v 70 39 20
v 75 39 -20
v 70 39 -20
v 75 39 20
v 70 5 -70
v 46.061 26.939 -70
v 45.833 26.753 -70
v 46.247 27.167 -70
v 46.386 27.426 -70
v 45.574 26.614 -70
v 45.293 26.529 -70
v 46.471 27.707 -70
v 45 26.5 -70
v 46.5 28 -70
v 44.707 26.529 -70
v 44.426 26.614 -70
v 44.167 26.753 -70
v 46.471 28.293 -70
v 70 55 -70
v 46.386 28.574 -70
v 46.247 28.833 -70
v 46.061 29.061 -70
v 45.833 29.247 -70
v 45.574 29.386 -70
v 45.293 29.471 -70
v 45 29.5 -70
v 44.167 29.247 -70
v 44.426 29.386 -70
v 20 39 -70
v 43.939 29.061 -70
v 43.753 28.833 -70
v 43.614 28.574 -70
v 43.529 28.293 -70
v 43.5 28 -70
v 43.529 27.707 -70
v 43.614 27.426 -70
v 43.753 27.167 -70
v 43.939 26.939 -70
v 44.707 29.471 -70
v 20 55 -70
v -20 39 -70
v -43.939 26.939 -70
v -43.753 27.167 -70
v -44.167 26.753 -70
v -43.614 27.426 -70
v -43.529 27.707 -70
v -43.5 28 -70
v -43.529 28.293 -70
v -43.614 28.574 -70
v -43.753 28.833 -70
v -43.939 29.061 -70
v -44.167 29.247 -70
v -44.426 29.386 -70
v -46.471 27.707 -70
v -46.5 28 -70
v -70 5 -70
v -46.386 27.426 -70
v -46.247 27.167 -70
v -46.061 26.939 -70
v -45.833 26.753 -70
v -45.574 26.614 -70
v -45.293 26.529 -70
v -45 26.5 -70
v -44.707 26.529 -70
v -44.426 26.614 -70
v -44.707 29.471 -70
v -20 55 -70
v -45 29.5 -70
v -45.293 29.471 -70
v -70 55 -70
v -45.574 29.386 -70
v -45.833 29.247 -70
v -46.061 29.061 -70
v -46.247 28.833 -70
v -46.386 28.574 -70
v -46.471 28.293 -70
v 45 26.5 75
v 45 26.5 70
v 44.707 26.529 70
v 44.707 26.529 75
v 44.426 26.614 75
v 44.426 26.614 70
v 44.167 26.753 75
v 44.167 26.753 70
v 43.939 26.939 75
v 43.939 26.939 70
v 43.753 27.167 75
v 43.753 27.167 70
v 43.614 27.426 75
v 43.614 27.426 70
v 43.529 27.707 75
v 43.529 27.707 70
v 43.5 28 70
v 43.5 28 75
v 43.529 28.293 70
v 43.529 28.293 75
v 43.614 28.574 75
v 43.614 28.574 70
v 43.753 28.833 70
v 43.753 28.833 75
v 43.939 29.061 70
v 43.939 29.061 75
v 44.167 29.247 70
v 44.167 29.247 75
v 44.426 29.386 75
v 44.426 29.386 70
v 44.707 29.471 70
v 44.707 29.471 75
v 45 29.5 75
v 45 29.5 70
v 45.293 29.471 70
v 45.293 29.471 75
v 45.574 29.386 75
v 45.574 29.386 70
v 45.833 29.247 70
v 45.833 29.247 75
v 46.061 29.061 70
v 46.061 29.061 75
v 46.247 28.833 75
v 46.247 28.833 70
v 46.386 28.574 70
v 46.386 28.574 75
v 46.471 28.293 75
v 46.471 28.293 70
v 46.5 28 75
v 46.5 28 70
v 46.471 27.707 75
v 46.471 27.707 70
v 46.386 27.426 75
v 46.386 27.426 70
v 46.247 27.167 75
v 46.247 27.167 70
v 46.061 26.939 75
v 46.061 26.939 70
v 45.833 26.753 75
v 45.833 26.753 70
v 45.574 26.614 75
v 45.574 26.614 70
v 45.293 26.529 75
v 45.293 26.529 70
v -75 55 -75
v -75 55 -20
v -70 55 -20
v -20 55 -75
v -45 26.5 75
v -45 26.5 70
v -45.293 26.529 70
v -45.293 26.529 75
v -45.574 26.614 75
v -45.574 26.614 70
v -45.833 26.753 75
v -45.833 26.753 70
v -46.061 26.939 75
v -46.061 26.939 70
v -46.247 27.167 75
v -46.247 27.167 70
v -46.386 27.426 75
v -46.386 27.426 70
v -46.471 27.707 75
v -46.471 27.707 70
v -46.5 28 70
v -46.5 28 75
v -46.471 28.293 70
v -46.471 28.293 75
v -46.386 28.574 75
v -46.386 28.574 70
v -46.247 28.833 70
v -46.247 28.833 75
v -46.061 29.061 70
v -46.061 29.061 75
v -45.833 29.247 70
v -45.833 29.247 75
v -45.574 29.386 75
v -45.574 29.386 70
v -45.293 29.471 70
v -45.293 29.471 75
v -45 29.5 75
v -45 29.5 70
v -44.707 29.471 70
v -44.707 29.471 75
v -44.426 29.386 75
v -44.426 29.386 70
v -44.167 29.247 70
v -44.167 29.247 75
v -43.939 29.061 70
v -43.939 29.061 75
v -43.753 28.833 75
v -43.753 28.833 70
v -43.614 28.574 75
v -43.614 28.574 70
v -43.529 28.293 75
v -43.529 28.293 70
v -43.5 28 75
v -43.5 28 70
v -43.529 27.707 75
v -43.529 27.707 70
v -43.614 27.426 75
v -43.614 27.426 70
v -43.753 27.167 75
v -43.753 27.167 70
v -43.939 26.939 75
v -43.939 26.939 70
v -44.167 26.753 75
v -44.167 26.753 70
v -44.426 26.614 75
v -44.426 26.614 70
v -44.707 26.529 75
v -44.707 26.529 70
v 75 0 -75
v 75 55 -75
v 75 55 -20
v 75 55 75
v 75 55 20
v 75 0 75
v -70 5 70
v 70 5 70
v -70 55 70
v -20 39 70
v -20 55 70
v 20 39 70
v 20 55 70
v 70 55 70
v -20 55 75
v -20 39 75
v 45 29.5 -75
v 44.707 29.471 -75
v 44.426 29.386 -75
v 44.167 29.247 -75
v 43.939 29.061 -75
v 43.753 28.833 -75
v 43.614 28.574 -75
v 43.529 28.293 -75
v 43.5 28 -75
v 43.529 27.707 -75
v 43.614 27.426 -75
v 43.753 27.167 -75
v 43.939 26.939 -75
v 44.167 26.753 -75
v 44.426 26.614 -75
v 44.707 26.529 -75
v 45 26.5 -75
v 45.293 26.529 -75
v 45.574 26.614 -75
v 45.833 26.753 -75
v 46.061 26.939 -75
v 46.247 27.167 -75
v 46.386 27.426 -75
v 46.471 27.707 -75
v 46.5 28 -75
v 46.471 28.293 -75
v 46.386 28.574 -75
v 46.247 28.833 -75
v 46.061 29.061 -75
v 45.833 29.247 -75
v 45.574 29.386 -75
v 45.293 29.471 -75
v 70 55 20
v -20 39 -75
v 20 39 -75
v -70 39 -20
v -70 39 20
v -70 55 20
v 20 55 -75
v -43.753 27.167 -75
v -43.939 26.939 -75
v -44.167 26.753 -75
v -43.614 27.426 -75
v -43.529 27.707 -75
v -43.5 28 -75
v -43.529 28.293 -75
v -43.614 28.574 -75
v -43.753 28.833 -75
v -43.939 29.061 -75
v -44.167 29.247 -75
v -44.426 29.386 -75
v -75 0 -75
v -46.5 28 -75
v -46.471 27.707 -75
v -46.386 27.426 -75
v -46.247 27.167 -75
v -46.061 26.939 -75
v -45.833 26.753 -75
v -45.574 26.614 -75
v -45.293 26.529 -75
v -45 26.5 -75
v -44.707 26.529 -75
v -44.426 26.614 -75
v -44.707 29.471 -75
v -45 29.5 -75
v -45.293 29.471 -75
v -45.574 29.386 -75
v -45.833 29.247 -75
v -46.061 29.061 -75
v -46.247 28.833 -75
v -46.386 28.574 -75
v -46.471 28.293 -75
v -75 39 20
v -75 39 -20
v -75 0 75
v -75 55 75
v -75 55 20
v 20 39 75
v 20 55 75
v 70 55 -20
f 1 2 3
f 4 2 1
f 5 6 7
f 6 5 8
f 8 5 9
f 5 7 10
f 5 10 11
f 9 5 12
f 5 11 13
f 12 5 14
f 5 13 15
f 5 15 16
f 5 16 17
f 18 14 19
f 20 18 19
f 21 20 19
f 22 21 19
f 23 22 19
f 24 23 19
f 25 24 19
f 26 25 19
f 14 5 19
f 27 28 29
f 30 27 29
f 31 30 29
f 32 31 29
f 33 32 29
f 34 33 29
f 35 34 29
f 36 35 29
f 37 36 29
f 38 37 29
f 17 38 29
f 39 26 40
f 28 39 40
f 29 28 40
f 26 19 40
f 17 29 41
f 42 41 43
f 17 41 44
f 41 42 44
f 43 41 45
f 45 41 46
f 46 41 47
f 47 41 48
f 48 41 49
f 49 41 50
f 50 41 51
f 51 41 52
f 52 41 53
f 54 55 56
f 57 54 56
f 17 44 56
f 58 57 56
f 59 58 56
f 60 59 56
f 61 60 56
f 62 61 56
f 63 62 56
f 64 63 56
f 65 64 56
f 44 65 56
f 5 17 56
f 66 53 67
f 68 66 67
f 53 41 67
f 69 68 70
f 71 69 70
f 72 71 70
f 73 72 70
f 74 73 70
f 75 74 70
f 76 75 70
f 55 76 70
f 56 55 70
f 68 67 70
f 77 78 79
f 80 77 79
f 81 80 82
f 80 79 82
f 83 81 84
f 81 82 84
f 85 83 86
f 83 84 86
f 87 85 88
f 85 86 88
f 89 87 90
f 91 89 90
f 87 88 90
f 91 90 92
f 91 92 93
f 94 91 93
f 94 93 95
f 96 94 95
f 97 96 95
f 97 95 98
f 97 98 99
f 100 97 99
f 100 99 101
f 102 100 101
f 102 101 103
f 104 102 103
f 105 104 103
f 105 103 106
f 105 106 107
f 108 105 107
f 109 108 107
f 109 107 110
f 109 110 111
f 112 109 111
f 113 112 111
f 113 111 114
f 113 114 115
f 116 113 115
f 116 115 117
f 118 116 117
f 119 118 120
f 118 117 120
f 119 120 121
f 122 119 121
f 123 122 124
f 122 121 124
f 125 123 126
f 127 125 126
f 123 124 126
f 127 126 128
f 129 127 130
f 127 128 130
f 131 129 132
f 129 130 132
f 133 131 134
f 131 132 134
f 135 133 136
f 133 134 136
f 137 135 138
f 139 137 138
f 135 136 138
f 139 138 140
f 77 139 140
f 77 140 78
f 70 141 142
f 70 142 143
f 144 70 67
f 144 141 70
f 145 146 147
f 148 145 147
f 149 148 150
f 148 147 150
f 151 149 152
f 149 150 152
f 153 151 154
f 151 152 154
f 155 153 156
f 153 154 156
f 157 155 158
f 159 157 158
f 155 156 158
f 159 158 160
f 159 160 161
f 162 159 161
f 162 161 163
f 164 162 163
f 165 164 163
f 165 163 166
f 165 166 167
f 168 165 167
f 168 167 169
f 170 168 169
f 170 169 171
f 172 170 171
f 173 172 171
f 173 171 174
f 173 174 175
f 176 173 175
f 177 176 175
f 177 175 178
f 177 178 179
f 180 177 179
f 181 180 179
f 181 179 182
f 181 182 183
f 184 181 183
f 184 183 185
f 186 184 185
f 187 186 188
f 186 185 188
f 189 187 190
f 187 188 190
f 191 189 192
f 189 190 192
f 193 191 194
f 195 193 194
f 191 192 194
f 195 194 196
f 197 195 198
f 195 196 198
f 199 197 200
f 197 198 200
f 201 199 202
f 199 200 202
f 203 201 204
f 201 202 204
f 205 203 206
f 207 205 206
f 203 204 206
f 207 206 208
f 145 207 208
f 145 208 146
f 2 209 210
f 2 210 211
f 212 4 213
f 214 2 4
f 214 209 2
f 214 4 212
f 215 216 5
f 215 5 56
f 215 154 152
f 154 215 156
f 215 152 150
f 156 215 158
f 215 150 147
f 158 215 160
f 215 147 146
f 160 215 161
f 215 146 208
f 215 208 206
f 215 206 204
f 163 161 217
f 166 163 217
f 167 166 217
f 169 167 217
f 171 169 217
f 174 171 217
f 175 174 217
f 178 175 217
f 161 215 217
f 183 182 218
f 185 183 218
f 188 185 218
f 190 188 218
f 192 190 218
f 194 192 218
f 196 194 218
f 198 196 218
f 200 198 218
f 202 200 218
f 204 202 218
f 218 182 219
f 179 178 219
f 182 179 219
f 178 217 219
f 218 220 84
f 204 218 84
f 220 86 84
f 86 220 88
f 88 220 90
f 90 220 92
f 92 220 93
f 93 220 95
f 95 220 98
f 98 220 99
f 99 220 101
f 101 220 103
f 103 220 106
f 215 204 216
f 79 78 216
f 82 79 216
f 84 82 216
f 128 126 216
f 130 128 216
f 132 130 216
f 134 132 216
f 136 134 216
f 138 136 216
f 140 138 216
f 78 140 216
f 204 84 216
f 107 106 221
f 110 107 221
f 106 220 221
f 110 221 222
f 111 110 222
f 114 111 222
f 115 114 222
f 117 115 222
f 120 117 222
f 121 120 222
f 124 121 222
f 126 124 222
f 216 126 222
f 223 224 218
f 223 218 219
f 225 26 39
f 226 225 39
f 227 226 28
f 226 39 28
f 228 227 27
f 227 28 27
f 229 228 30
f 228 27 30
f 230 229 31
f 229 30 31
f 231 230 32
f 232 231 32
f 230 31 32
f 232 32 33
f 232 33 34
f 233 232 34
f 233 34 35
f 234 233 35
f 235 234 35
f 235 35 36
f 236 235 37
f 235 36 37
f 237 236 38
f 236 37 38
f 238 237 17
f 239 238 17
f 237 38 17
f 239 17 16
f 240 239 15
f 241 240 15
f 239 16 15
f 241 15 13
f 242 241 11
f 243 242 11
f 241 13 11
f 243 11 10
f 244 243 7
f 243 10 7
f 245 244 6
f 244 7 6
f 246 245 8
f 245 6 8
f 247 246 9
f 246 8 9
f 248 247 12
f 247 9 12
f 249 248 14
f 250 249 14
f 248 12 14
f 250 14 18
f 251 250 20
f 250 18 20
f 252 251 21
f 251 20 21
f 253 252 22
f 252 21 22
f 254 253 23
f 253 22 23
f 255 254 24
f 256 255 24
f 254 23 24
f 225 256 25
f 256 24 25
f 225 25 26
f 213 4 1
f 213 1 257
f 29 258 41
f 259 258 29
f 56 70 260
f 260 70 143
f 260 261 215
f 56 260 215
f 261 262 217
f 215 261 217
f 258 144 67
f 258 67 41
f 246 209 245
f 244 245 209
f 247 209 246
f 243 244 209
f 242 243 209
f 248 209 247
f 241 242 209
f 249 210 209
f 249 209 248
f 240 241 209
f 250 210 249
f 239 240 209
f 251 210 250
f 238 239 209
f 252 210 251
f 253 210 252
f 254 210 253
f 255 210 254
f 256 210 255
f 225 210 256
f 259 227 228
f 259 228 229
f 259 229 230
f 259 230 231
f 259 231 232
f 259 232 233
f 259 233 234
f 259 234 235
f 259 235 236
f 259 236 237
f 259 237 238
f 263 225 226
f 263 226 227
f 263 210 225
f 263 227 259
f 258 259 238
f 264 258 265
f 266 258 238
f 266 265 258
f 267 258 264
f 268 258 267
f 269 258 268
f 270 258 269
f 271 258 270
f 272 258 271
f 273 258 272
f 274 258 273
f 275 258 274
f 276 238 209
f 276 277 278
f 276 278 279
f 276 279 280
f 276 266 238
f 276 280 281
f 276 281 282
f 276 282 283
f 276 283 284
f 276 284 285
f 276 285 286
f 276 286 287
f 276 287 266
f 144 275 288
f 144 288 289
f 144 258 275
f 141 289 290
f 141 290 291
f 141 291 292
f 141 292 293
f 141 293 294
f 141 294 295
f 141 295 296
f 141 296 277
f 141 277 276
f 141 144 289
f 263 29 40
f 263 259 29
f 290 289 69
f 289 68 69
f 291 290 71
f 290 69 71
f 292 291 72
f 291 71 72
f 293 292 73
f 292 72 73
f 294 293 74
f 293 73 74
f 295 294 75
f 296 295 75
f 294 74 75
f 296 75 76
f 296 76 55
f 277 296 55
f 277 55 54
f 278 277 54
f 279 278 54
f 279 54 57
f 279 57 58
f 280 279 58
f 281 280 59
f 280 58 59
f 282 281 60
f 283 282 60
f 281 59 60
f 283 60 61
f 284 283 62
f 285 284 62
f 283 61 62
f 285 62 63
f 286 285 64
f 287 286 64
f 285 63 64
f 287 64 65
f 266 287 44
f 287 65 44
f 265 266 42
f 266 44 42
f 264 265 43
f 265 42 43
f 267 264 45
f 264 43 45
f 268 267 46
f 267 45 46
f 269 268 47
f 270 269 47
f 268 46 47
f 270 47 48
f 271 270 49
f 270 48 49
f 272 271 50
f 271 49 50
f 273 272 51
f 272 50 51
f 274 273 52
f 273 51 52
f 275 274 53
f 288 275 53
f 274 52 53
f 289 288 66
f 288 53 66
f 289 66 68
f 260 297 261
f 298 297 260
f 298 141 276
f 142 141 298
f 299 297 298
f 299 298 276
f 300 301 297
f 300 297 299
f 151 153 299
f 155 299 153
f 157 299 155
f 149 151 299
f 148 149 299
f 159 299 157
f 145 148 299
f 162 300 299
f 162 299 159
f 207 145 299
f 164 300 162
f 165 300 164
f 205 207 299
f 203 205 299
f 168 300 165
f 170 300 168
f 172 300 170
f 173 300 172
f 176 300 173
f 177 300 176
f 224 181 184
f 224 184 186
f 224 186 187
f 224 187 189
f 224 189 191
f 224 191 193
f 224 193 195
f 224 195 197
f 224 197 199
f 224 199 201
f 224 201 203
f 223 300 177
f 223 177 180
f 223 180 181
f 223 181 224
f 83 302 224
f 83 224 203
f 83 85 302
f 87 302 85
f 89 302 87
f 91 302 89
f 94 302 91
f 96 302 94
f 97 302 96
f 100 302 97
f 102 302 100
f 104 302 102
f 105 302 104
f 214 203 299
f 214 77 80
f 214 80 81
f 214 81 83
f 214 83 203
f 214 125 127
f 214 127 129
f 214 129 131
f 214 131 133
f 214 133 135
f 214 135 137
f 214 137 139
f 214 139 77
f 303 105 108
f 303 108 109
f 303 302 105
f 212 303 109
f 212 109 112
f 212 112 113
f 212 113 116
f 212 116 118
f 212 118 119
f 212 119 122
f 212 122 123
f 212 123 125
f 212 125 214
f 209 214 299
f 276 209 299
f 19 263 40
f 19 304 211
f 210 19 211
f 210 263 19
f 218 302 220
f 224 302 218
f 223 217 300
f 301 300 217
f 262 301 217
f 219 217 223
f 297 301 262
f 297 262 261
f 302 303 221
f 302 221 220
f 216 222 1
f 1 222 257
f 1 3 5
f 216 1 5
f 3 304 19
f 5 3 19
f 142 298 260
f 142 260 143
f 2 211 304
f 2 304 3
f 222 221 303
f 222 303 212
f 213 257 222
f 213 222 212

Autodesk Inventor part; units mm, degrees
ref_plane "YZ Plane" through (0, 0, 0) normal (1, 0, 0) x (0, 1, 0)
ref_plane "XZ Plane" through (0, 0, 0) normal (0, 1, 0) x (-1, 0, 0)
ref_plane "XY Plane" through (0, 0, 0) normal (0, 0, 1) x (1, 0, 0)
sketch "Szkic1" plane through (0, 0, 0) normal (0, 1, 0) x (-1, 0, 0)
  line L0 (-75, 75) -> (75, 75)
  line L1 (75, 75) -> (75, -75)
  line L2 (75, -75) -> (-75, -75)
  line L3 (-75, -75) -> (-75, 75)
  line L4 (-75, 75) -> (75, -75) construction
  line L5 (75, 75) -> (-75, -75) construction
  point P0 (0, 0)
  dimension "d0" = 150
  dimension "d1" = 150
extrude "Wyciągnięcie proste1" add sketch "Szkic1" along normal blind 5
sketch "Szkic2" plane through (75, 0, 75) normal (1, 0, 0) x (0, 0, -1)
  line L0 (0, 5) -> (150, 5)
  line L1 (150, 5) -> (150, 55)
  line L2 (150, 55) -> (0, 55)
  line L3 (0, 55) -> (0, 5)
  line L4 (50, 55) -> (100, 55)
  point P0 (75, 0)
  dimension "d4" = 50
extrude "Wyciągnięcie proste2" add sketch "Szkic2" against normal blind 5
sketch "Szkic3" plane through (-75, 0, -75) normal (-1, 0, 0) x (0, 0, 1)
  line L0 (0, 5) -> (150, 5)
  line L1 (150, 5) -> (150, 55)
  line L2 (150, 55) -> (0, 55)
  line L3 (0, 55) -> (0, 5)
  point P0 (75, 0)
  dimension "d7" = 50
extrude "Wyciągnięcie proste3" add sketch "Szkic3" against normal blind 5
sketch "Szkic4" plane through (-75, 0, 75) normal (0, 0, 1) x (1, 0, 0)
  line L0 (5, 5) -> (145, 5)
  line L1 (145, 5) -> (145, 55)
  line L2 (145, 55) -> (5, 55)
  line L3 (5, 55) -> (5, 5)
  point P0 (75, 0)
extrude "Wyciągnięcie proste4" add sketch "Szkic4" against normal blind 5
sketch "Szkic5" plane through (75, 0, -75) normal (0, 0, -1) x (-1, 0, 0)
  line L0 (5, 5) -> (145, 5)
  line L1 (145, 5) -> (145, 55)
  line L2 (145, 55) -> (5, 55)
  line L3 (5, 55) -> (5, 5)
  point P0 (75, 0)
extrude "Wyciągnięcie proste5" add sketch "Szkic5" against normal blind 5
sketch "Szkic10" plane through (-75, 0, 75) normal (0, 0, 1) x (1, 0, 0)
  circle A0 centre (30, 28) radius 1.5
  circle A1 centre (120, 28) radius 1.5
  point P0 (75, 0)
  dimension "d53" = 3
  dimension "d54" = 3
hole "Otwór5" at (45, 28, 75) at (-45, 28, 75) direction (0, 0, -1) diameter 3 depth 8 tip angle 118
sketch "Szkic11" plane through (75, 0, -75) normal (0, 0, -1) x (-1, 0, 0)
  circle A0 centre (30, 28) radius 1.5
  circle A1 centre (120, 28) radius 1.5
  point P0 (75, 0)
  dimension "d62" = 3
  dimension "d63" = 3
hole "Otwór6" at (45, 28, -75) at (-45, 28, -75) direction (0, 0, 1) diameter 3 depth 8 tip angle 118
sketch "Szkic12" plane through (70, 0, 75) normal (-1, 0, 0) x (0, 0, 1)
  line L0 (-145, 55) -> (-145, 5) projected
  line L1 (-5, 5) -> (-145, 5) projected
  line L2 (-5, 5) -> (-5, 55) projected
  line L3 (-5, 55) -> (-145, 55) projected
  point P0 (-75, 0)
sketch "Szkic13" plane through (75, 0, 75) normal (1, 0, 0) x (0, 0, -1)
  line L0 (150, 0) -> (0, 0) projected
  line L1 (150, 0) -> (150, 55) projected
  line L2 (150, 55) -> (0, 55) projected
  line L3 (0, 0) -> (0, 55) projected
  point P0 (75, 0)
sketch "Szkic14" plane through (75, 0, 75) normal (1, 0, 0) x (0, 0, -1)
  line L0 (150, 55) -> (0, 55) projected
  line L1 (55, 55) -> (95, 55)
  line L2 (95, 55) -> (95, 39)
  line L3 (95, 39) -> (55, 39)
  line L4 (55, 39) -> (55, 55)
  point P0 (75, 0)
  dimension "d73" = 40
  dimension "d74" = 16
extrude "Wyciągnięcie proste6" cut sketch "Szkic14" against normal blind 5
sketch "Szkic15" plane through (75, 0, -75) normal (0, 0, -1) x (-1, 0, 0)
  line L0 (150, 55) -> (0, 55) projected
  line L1 (55, 55) -> (95, 55)
  line L2 (95, 55) -> (95, 39)
  line L3 (95, 39) -> (55, 39)
  line L4 (55, 39) -> (55, 55)
  point P0 (75, 0)
  dimension "d77" = 40
  dimension "d78" = 16
extrude "Wyciągnięcie proste7" cut sketch "Szkic15" against normal blind 5
sketch "Szkic16" plane through (-75, 0, 75) normal (0, 0, 1) x (1, 0, 0)
  line L0 (150, 55) -> (0, 55) projected
  line L1 (55, 55) -> (95, 55)
  line L2 (95, 55) -> (95, 39)
  line L3 (95, 39) -> (55, 39)
  line L4 (55, 39) -> (55, 55)
  point P0 (75, 0)
  dimension "d81" = 40
  dimension "d82" = 16
extrude "Wyciągnięcie proste8" cut sketch "Szkic16" against normal blind 5
sketch "Szkic17" plane through (-75, 0, -75) normal (-1, 0, 0) x (0, 0, 1)
  line L0 (150, 55) -> (0, 55) projected
  line L1 (55, 55) -> (95, 55)
  line L2 (95, 55) -> (95, 39)
  line L3 (95, 39) -> (55, 39)
  line L4 (55, 39) -> (55, 55)
  point P0 (75, 0)
  dimension "d85" = 40
  dimension "d86" = 16
extrude "Wyciągnięcie proste9" cut sketch "Szkic17" against normal blind 5
properties part number "korpus" material "Stal"
